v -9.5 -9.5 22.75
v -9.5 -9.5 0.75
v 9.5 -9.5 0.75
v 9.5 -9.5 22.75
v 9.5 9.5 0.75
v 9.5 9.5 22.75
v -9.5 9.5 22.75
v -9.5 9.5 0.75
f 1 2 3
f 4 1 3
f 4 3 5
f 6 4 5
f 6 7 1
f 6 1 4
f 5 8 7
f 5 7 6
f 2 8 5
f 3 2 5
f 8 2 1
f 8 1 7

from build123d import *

# Parameters (mm, degrees)
CUBE009_W     = 8
CUBE009_H     = 8
CUBE009_DEPTH = 22
CUBE008_W     = 8
CUBE008_H     = 8
CUBE008_DEPTH = 22
CUBE007_W     = 8
CUBE007_H     = 8
CUBE007_DEPTH = 22
CUBE006_W     = 8
CUBE006_H     = 8
CUBE006_DEPTH = 22
CUBE011_W     = 18
CUBE011_H     = 1
CUBE011_DEPTH = 22
CUBE010_W     = 1
CUBE010_H     = 18
CUBE010_DEPTH = 22
CUBE005_W     = 19
CUBE005_H     = 19
CUBE005_DEPTH = 22


with BuildPart() as cube009:
    # cube009 → cube009 (new body)
    with BuildSketch(Plane(origin=(0.5, 0.5, -11), x_dir=(1, 0, 0), z_dir=(0, 0, 1))):
        with Locations((4, 4)):
            Rectangle(CUBE009_W, CUBE009_H)
    extrude(amount=CUBE009_DEPTH)


with BuildPart() as group006:
    # cube008 → cube008 (new body)
    with BuildSketch(Plane(origin=(0.5, -8.5, -11), x_dir=(1, 0, 0), z_dir=(0, 0, 1))):
        with Locations((4, 4)):
            Rectangle(CUBE008_W, CUBE008_H)
    extrude(amount=CUBE008_DEPTH)

    # Group006: union cube009
    add(cube009.part)


with BuildPart() as cube007:
    # cube007 → cube007 (new body)
    with BuildSketch(Plane(origin=(-8.5, 0.5, -11), x_dir=(1, 0, 0), z_dir=(0, 0, 1))):
        with Locations((4, 4)):
            Rectangle(CUBE007_W, CUBE007_H)
    extrude(amount=CUBE007_DEPTH)


with BuildPart() as group007:
    # cube006 → cube006 (new body)
    with BuildSketch(Plane(origin=(-8.5, -8.5, -11), x_dir=(1, 0, 0), z_dir=(0, 0, 1))):
        with Locations((4, 4)):
            Rectangle(CUBE006_W, CUBE006_H)
    extrude(amount=CUBE006_DEPTH)

    # Group005: union cube007
    add(cube007.part)

    # Group007: union Group006
    add(group006.part)


with BuildPart() as cube011:
    # cube011 → cube011 (new body)
    with BuildSketch(Plane(origin=(-9, -0.5, -11), x_dir=(1, 0, 0), z_dir=(0, 0, 1))):
        with Locations((9, 0.5)):
            Rectangle(CUBE011_W, CUBE011_H)
    extrude(amount=CUBE011_DEPTH)


with BuildPart() as group008:
    # cube010 → cube010 (new body)
    with BuildSketch(Plane(origin=(-0.5, -9, -11), x_dir=(1, 0, 0), z_dir=(0, 0, 1))):
        with Locations((0.5, 9)):
            Rectangle(CUBE010_W, CUBE010_H)
    extrude(amount=CUBE010_DEPTH)

    # Group008: union cube011
    add(cube011.part)


with BuildPart() as group009:
    # cube005 → cube005 (new body)
    with BuildSketch(Plane(origin=(-9.5, -9.5, -11), x_dir=(1, 0, 0), z_dir=(0, 0, 1))):
        with Locations((9.5, 9.5)):
            Rectangle(CUBE005_W, CUBE005_H)
    extrude(amount=CUBE005_DEPTH)

    # Group009: union Group007, Group008
    add(group007.part)
    add(group008.part)


with BuildPart() as group009_1:
    # Group009 placement: moved
    add(group009.part.moved(Location((0, 0, 11.75))))


solid = group009_1.part
